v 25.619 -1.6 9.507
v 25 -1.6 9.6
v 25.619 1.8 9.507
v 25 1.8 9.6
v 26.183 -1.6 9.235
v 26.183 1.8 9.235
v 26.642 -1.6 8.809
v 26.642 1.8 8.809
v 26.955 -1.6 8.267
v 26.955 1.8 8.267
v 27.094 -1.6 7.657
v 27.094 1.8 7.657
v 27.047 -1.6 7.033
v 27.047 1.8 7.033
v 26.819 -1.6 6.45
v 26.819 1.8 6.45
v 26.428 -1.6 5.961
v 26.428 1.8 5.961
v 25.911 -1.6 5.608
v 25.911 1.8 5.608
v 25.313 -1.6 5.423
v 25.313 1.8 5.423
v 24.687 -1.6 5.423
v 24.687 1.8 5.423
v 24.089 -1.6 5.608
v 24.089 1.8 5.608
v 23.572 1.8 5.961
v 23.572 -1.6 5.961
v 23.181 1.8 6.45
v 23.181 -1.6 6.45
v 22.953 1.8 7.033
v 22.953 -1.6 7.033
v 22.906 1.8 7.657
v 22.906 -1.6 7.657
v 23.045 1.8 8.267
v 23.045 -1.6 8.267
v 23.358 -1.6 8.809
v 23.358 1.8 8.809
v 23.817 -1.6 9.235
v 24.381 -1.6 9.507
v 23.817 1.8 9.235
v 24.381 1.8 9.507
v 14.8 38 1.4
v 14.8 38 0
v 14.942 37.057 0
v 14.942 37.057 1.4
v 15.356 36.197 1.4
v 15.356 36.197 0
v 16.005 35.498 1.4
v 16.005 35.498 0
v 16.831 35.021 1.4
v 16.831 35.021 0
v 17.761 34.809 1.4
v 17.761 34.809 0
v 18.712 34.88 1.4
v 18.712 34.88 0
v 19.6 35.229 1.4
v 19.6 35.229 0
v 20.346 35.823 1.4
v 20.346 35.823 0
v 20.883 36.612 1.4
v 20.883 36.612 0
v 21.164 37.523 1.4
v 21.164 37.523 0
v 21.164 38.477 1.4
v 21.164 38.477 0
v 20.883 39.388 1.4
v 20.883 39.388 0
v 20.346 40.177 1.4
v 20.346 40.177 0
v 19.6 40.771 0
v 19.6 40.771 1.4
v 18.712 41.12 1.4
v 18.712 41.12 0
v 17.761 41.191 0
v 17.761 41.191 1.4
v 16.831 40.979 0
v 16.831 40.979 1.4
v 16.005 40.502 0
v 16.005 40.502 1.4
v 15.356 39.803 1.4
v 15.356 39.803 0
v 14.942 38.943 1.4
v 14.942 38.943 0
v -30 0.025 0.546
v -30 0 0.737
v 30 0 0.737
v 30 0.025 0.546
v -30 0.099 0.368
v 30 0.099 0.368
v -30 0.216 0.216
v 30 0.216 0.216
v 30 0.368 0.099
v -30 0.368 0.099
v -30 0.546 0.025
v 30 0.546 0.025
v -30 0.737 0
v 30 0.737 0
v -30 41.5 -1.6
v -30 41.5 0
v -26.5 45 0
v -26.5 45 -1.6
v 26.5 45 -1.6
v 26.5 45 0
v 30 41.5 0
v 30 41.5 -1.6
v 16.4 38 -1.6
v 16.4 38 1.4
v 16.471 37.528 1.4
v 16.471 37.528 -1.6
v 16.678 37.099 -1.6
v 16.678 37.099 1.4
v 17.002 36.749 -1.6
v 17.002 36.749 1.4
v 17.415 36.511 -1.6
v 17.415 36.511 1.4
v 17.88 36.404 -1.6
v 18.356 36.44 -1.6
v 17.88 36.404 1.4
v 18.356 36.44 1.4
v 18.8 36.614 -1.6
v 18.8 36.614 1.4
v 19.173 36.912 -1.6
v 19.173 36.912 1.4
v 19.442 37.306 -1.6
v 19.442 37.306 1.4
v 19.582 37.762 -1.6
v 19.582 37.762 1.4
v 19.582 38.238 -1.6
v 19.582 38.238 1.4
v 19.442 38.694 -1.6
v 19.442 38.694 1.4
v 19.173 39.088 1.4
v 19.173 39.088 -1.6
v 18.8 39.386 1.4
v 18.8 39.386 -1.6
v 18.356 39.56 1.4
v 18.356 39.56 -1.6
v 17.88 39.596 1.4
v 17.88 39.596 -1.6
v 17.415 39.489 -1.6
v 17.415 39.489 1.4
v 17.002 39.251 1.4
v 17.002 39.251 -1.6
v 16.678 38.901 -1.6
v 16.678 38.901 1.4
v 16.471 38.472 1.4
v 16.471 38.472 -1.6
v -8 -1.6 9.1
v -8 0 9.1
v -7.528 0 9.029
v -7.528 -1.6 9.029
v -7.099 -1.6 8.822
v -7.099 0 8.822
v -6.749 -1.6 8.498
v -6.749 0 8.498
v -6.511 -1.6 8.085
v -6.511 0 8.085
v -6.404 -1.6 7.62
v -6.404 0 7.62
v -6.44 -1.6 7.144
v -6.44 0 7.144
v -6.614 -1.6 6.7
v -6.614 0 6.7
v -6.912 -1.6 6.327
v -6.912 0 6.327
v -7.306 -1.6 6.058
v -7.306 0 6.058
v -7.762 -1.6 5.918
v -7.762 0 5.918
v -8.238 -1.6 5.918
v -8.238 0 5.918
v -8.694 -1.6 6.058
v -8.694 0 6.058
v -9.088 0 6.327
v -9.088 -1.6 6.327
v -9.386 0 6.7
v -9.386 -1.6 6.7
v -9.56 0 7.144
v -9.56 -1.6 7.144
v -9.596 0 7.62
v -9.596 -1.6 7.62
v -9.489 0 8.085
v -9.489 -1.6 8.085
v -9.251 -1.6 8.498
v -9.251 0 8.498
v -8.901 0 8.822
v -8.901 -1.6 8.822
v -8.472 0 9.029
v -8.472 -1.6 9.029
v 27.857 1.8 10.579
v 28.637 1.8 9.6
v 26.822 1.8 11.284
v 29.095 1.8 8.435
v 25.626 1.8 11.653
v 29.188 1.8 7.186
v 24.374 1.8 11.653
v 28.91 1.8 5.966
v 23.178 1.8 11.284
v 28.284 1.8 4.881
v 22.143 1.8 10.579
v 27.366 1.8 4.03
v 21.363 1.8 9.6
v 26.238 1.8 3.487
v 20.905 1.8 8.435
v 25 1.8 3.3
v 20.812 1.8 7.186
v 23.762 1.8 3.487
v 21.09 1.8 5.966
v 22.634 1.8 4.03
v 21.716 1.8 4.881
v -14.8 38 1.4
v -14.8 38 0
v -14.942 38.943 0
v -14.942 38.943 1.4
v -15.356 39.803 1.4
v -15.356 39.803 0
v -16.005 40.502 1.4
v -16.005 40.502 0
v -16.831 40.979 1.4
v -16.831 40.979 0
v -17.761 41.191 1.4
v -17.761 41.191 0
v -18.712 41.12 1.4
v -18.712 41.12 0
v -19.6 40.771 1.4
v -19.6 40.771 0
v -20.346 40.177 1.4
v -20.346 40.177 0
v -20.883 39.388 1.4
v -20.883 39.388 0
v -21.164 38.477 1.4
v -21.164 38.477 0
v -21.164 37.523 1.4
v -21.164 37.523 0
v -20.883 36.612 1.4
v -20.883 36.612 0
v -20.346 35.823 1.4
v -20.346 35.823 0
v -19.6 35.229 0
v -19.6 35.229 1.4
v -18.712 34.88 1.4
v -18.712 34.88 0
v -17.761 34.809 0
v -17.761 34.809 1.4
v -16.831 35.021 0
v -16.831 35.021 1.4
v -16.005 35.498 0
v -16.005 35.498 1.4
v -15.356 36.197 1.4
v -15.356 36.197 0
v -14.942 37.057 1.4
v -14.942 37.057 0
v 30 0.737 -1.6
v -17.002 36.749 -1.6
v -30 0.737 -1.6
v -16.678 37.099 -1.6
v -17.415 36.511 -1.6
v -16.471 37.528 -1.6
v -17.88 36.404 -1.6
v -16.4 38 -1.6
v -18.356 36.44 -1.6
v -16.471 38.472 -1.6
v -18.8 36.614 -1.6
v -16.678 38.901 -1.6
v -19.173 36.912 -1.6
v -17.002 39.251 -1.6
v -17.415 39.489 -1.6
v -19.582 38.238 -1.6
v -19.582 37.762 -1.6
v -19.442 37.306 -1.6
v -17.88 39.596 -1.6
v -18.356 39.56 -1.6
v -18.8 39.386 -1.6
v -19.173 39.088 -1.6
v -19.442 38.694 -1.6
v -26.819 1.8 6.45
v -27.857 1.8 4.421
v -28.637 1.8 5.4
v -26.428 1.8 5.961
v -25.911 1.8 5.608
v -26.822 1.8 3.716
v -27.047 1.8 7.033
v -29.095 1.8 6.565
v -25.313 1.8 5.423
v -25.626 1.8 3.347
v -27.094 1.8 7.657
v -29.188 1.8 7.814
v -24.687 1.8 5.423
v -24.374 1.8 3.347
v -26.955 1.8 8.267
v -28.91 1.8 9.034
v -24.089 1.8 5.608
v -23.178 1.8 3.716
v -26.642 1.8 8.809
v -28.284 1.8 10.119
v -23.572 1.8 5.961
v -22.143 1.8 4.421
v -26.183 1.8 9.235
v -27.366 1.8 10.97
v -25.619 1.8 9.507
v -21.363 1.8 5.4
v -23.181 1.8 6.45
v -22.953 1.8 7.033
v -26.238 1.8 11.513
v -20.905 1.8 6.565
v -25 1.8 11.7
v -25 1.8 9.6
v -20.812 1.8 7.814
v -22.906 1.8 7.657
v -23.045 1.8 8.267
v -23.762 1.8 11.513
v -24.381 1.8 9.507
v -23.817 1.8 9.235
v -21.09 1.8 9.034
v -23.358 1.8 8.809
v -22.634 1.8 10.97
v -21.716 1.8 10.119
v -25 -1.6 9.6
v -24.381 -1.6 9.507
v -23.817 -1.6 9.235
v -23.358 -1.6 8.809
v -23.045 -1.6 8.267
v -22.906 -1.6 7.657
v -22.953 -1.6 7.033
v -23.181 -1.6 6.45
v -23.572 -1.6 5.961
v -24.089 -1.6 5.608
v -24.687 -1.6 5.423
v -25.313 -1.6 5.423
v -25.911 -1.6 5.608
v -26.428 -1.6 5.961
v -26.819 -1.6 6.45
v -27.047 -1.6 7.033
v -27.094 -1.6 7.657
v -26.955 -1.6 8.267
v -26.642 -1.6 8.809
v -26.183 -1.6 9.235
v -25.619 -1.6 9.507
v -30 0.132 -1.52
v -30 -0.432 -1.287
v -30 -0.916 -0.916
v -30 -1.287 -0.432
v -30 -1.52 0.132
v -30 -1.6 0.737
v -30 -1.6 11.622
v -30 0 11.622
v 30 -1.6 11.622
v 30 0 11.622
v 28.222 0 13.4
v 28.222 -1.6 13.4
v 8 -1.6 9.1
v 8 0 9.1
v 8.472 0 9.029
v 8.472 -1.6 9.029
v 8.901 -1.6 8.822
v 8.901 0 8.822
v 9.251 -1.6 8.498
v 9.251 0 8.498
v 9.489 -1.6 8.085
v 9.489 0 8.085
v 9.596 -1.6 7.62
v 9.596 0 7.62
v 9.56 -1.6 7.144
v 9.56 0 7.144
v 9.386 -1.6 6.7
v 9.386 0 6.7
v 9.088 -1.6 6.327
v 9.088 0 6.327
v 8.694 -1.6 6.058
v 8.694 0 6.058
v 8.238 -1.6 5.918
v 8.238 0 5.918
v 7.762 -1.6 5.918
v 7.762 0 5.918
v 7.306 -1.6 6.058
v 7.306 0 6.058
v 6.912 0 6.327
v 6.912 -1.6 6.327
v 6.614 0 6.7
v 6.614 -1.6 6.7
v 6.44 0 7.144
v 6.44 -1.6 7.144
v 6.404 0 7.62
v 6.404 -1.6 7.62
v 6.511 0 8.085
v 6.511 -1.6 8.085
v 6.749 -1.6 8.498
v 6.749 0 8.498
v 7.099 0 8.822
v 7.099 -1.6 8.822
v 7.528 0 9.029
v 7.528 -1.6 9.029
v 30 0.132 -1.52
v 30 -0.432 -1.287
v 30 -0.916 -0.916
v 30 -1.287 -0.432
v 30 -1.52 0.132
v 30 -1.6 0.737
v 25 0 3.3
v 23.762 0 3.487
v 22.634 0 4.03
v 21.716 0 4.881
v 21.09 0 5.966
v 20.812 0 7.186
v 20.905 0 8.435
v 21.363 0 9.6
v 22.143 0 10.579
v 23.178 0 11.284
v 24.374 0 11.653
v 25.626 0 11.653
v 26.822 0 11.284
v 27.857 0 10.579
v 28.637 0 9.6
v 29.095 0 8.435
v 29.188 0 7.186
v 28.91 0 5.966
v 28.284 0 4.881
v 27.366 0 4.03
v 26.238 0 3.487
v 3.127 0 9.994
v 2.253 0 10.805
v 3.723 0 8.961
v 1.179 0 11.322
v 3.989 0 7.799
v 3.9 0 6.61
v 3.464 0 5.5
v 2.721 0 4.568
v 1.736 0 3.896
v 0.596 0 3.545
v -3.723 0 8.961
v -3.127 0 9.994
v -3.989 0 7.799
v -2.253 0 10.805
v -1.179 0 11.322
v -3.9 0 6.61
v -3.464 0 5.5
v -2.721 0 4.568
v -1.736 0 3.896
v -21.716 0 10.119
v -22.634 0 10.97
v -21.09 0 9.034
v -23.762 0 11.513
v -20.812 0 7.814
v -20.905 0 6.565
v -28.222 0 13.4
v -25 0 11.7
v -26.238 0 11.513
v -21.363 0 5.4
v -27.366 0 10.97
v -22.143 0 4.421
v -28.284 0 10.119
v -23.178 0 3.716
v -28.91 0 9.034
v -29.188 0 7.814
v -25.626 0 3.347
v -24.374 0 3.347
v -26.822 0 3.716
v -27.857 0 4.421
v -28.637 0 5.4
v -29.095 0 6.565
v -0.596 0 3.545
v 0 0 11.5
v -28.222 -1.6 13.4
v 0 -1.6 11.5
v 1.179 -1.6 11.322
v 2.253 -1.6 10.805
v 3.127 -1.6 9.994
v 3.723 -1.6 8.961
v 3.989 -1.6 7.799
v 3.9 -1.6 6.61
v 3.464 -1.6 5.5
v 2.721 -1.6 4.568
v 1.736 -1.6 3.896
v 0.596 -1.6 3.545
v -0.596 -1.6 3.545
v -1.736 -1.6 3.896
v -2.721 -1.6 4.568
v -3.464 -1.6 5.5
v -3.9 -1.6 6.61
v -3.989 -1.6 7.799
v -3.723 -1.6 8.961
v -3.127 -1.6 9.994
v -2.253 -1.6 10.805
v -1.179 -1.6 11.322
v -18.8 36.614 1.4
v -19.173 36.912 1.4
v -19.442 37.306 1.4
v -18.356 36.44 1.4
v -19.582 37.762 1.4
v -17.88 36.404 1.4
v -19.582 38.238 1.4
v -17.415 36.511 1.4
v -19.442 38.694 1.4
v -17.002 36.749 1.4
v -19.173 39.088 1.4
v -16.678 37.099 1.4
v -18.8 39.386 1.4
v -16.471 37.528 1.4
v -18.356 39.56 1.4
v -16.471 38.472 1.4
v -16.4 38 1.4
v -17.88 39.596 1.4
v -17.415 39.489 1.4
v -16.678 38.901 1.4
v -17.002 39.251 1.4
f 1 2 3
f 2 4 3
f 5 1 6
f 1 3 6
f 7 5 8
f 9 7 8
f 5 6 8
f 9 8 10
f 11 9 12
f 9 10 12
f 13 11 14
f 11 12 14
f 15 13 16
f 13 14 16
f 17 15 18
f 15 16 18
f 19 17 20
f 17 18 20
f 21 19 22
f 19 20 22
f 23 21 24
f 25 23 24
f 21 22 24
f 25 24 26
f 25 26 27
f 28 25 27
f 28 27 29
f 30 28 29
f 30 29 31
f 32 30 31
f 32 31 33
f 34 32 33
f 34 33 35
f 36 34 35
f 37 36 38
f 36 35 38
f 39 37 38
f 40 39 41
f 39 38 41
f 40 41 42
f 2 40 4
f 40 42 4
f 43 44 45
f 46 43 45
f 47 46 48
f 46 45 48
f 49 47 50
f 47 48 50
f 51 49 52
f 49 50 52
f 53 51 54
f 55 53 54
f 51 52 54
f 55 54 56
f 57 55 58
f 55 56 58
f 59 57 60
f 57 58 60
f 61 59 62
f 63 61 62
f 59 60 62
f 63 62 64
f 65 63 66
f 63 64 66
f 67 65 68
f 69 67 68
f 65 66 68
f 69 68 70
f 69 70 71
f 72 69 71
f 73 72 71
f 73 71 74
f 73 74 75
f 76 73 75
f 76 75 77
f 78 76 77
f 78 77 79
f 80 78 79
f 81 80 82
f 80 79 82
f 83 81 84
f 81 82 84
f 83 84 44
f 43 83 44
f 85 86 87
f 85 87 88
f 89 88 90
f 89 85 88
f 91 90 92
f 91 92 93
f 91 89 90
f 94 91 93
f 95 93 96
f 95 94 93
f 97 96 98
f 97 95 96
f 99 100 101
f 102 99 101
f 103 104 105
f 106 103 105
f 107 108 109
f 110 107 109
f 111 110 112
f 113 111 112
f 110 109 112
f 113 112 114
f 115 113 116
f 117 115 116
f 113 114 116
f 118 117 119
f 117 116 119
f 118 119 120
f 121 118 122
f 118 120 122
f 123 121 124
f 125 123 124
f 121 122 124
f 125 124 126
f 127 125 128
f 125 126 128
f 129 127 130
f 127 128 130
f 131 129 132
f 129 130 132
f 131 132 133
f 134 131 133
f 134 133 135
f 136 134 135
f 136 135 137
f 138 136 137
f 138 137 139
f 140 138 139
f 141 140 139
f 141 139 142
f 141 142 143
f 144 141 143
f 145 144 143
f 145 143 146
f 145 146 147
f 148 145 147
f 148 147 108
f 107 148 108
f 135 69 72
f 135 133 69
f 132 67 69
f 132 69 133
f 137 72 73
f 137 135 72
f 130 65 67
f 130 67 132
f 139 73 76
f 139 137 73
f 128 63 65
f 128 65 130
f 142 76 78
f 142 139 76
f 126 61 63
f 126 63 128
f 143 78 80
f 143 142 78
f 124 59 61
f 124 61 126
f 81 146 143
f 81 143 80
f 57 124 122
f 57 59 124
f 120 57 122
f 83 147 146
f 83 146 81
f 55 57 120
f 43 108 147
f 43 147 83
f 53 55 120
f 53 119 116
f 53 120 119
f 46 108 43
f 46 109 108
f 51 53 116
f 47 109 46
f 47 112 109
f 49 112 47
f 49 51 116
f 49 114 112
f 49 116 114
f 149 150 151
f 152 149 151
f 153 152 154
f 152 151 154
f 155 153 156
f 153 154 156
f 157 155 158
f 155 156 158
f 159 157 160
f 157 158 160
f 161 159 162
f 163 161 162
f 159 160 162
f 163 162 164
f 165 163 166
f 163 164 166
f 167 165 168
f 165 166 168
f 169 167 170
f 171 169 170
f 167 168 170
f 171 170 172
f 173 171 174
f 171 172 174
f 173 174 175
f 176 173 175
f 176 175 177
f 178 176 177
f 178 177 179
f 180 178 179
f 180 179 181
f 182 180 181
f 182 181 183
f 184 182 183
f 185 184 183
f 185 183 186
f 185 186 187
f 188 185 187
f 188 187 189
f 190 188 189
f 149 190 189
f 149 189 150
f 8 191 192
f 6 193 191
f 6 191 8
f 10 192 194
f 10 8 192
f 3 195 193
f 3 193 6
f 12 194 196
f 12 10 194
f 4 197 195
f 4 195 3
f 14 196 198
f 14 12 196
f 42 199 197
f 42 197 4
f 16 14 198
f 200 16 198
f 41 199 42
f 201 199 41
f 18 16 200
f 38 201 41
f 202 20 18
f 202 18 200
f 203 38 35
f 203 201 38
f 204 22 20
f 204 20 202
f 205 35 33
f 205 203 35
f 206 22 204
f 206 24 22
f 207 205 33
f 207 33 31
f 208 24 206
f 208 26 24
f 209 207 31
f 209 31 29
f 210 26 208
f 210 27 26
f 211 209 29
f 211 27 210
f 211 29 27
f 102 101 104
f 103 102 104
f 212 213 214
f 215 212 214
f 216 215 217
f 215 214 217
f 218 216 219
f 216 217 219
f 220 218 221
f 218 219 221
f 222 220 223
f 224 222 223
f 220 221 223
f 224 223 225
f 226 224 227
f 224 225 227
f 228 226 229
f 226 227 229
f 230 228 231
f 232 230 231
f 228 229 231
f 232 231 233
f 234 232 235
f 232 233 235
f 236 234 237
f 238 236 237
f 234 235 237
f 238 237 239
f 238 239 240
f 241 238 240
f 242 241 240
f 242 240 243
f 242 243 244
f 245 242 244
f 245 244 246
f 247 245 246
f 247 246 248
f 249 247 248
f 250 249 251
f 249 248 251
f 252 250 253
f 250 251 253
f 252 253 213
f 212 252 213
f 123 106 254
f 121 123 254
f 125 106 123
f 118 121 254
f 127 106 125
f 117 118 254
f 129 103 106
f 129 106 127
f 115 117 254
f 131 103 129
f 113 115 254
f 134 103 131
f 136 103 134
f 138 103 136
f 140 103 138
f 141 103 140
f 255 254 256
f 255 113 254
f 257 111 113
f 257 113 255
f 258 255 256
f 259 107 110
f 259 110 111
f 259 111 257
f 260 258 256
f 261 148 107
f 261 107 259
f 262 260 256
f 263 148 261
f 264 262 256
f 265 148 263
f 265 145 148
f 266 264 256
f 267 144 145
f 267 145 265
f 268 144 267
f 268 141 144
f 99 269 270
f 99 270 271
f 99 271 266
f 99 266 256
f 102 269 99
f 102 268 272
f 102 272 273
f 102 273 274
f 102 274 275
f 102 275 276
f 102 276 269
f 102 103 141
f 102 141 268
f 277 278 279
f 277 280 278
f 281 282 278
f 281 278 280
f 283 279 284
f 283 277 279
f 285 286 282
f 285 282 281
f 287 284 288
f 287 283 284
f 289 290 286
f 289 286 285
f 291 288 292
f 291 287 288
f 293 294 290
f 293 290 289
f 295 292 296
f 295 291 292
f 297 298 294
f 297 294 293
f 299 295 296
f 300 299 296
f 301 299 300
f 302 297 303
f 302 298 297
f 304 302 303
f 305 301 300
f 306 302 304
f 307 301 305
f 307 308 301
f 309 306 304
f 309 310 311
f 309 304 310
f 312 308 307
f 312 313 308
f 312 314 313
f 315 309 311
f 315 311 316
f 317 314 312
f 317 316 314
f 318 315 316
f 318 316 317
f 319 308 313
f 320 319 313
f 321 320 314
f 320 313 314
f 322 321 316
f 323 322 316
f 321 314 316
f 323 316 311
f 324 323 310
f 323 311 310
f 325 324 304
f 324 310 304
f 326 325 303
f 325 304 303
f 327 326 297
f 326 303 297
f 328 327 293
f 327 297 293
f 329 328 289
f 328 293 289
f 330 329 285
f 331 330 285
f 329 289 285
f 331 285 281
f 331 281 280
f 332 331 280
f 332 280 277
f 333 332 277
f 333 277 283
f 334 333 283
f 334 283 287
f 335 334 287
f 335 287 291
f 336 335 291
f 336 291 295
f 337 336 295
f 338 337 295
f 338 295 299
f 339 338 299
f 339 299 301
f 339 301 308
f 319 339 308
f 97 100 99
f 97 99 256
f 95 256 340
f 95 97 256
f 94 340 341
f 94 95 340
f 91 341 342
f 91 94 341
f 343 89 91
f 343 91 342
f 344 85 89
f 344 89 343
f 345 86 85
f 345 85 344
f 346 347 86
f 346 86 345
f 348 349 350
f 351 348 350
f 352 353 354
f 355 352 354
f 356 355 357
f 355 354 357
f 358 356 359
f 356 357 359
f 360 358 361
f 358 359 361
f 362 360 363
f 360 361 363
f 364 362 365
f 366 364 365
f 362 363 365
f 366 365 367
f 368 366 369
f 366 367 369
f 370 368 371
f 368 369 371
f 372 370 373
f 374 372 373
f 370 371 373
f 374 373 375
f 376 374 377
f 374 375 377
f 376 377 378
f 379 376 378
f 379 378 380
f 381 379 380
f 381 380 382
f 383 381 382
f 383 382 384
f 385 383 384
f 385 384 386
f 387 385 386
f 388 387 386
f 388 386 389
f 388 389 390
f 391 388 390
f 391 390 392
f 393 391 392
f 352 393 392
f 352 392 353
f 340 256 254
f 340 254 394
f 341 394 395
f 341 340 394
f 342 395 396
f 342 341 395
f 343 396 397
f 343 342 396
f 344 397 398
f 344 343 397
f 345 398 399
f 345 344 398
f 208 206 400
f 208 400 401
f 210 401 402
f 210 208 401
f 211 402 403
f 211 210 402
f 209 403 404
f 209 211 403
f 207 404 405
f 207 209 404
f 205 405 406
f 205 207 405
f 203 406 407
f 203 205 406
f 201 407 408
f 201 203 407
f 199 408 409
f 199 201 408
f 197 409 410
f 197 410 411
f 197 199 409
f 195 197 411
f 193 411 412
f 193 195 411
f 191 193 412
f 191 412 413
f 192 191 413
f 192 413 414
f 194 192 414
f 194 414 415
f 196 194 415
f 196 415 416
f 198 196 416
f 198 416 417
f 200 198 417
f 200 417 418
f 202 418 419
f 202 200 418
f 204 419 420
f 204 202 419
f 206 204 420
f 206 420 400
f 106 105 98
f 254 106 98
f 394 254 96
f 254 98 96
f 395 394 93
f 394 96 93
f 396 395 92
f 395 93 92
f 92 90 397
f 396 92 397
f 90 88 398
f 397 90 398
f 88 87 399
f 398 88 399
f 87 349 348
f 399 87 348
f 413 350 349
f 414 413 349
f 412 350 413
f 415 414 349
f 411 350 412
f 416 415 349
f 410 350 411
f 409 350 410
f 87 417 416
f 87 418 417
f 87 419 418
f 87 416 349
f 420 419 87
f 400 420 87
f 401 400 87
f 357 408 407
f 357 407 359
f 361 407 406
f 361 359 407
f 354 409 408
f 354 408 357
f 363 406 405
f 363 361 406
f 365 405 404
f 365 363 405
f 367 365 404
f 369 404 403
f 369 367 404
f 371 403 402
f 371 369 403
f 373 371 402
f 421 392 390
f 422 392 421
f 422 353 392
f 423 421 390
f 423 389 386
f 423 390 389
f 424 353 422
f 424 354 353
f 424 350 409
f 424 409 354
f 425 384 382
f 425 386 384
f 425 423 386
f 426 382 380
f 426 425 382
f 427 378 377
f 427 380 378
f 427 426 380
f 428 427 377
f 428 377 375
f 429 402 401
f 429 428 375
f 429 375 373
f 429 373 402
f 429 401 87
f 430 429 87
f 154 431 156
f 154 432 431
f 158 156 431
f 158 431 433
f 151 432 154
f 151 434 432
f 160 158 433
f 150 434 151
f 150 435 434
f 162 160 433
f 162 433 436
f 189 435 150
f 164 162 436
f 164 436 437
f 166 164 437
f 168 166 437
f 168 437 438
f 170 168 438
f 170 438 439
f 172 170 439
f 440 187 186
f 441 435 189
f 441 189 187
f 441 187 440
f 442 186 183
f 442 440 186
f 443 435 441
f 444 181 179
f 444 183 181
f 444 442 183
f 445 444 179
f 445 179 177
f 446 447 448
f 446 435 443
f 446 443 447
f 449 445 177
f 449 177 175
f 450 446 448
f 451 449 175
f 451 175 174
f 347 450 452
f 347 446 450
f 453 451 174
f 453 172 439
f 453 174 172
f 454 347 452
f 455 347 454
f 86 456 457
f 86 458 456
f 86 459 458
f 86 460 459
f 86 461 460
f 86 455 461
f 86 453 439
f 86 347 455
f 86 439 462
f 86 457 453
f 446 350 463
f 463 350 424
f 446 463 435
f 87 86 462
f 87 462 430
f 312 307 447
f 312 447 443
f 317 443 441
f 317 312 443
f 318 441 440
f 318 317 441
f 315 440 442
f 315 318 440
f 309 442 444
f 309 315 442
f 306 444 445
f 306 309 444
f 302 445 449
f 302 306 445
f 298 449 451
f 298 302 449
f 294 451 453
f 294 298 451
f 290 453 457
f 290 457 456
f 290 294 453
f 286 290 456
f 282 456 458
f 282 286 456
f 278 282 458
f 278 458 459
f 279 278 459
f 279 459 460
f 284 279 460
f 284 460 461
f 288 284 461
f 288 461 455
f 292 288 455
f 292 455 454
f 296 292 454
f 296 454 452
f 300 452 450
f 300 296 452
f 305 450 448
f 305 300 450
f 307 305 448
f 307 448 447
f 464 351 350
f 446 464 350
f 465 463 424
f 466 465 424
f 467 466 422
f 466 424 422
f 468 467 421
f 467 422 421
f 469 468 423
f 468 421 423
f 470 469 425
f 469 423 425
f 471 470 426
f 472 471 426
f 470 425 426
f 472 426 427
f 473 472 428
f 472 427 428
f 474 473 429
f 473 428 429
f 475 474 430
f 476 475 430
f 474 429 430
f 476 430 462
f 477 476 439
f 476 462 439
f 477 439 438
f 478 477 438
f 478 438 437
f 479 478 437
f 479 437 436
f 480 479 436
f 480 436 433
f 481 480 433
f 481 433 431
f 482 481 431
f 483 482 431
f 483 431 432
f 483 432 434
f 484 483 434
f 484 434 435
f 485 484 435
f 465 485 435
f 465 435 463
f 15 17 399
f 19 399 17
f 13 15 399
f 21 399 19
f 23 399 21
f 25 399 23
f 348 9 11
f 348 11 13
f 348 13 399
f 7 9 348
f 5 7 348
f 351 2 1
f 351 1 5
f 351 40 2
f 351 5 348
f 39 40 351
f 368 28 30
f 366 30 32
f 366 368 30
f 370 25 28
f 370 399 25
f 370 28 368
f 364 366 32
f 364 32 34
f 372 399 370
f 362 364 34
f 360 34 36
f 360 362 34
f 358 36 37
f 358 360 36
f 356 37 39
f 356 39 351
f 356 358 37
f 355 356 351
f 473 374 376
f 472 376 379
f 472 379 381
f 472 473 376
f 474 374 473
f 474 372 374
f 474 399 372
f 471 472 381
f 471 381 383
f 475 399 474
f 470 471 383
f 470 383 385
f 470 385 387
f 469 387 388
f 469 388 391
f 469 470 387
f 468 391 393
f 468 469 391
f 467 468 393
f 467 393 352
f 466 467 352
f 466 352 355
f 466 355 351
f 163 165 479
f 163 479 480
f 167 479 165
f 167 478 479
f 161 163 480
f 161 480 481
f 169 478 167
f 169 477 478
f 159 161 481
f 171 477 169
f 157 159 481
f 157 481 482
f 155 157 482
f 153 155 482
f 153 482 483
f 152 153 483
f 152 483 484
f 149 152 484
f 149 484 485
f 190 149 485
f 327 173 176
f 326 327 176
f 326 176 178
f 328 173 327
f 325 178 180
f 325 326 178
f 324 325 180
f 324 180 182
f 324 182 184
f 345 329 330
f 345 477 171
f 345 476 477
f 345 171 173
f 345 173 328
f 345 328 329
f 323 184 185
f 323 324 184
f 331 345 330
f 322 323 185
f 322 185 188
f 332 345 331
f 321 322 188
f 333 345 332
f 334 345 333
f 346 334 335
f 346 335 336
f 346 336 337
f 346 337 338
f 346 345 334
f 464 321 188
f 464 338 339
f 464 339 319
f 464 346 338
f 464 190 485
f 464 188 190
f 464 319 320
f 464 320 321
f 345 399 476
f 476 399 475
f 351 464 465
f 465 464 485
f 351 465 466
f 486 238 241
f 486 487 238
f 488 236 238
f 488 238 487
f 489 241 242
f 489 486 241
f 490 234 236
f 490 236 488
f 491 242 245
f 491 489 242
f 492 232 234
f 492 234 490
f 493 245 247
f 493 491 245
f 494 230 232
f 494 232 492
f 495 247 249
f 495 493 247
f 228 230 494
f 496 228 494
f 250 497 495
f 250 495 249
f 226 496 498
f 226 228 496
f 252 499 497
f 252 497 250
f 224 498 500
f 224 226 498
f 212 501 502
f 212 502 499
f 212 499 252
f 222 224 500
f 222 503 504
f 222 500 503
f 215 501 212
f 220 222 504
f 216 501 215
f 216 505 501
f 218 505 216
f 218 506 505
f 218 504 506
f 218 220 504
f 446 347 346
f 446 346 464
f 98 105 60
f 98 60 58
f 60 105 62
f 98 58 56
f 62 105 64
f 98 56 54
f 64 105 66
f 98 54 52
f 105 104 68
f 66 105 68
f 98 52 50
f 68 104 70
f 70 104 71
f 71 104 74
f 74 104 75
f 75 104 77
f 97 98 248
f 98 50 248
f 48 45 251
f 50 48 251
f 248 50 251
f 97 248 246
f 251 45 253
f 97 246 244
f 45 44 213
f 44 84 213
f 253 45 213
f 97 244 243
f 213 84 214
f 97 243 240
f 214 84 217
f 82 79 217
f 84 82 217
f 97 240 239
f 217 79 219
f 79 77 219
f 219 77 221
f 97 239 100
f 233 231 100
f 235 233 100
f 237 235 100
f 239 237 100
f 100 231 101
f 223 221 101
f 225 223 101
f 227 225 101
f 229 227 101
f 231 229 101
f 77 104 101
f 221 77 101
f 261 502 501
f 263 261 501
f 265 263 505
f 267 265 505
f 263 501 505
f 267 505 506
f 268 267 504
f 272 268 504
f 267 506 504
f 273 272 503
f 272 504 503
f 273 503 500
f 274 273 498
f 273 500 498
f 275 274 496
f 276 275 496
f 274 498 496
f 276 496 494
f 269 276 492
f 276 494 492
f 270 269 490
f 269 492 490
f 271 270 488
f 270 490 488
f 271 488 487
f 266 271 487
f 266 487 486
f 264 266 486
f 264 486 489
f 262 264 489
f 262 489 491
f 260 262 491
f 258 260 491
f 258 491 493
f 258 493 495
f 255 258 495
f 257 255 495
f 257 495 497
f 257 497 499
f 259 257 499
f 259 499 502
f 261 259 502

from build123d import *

# Parameters (mm, degrees)
SM_BASE_FLANGE_1_DEPTH           = 1.6
SM_EDGE_FLANGE_1_STRIP_W         = 7.8732
SM_EDGE_FLANGE_1_STRIP_H         = 1.6
SM_EDGE_FLANGE_1_STRIP_CUT_DEPTH = 60
SM_EDGE_FLANGE_1_DEPTH           = 60
CUT_EXTRUDE_1_DEPTH              = 56.718578589
SKETCH_9_R                       = 2.1
SKETCH_9_R_2                     = 1.6
SKETCH_9_R_3                     = 4
CUT_EXTRUDE_3_DEPTH              = 10
EXTRUDE_START                    = 1.8
SKETCH_10_R                      = 4.2
SKETCH_10_R_2                    = 2.1
EXTRUDE_2_DEPTH                  = 1.8
SKETCH_11_R                      = 3.2
EXTRUDE_3_DEPTH                  = 1.4
SKETCH_12_R                      = 1.6
CUT_EXTRUDE_4_DEPTH              = 56.398555938


# Sheet-metal steps are written as plain solids
with BuildPart() as part:
    # Sketch 1 → 基体-法兰1 (new body)
    with BuildSketch(Plane.XY):
        Polygon((-26.5, 45), (26.5, 45), (30, 41.5), (30, 0), (-30, 0), (-30, 41.5), align=None)
    extrude(amount=-SM_BASE_FLANGE_1_DEPTH)

    # 边线-法兰1 strip (across the edge) → 边线-法兰1 strip cut (cut)
    with BuildSketch(Plane.YZ.offset(-30)):
        with Locations((-3.2, -0.8)):
            Rectangle(SM_EDGE_FLANGE_1_STRIP_W, SM_EDGE_FLANGE_1_STRIP_H)
    extrude(amount=SM_EDGE_FLANGE_1_STRIP_CUT_DEPTH, mode=Mode.SUBTRACT)

    # 边线-法兰1 section (across the edge) → 边线-法兰1 (add)
    with BuildSketch(Plane.YZ.offset(-30)):
        with BuildLine():
            Line((-1.6, 0.7366), (-1.6, 13.4))
            Line((-1.6, 13.4), (0, 13.4))
            Line((0, 13.4), (0, 0.7366))
            ThreePointArc((0, 0.7366), (0.215745145, 0.215745145), (0.7366, 0))
            Line((0.7366, 0), (0.7366, -1.6))
            ThreePointArc((0.7366, -1.6), (-0.915625705, -0.915625705), (-1.6, 0.7366))
        make_face()
    extrude(amount=SM_EDGE_FLANGE_1_DEPTH)

    # 草图8 → 切除-拉伸1 (cut, through all)
    with BuildSketch(Plane(origin=(0, 0, 0), x_dir=(1, 0, 0), z_dir=(0, 1, 0))):
        Polygon((-30, -11.622497289), (-28.222497289, -13.4), (-30, -13.4), align=None)
        Polygon((28.222497289, -13.4), (30, -13.4), (30, -11.622497289), align=None)
    extrude(amount=-CUT_EXTRUDE_1_DEPTH, mode=Mode.SUBTRACT)

    # 草图9 → 切除-拉伸3 (cut)
    with BuildSketch(Plane(origin=(0, 0, 0), x_dir=(1, 0, 0), z_dir=(0, 1, 0))):
        with Locations(Location((-25, -7.5, 0), (0, 0, 270))):
            Circle(SKETCH_9_R)
        with Locations(Location((-8, -7.5, 0), (0, 0, 270))):
            Circle(SKETCH_9_R_2)
        with Locations(Location((0, -7.5, 0), (0, 0, 270))):
            Circle(SKETCH_9_R_3)
        with Locations(Location((25, -7.5, 0), (0, 0, 270))):
            Circle(SKETCH_9_R)
        with Locations(Location((8, -7.5, 0), (0, 0, 270))):
            Circle(SKETCH_9_R_2)
    extrude(amount=-CUT_EXTRUDE_3_DEPTH, mode=Mode.SUBTRACT)

    # 草图10 → 凸台-拉伸2 (add)
    # profile 1 of 2: a face of its own
    with BuildSketch(Plane(origin=(0, 0, 0), x_dir=(1, 0, 0), z_dir=(0, 1, 0)).offset(EXTRUDE_START)):
        with Locations(Location((-25, -7.5, 0), (0, 0, 270))):
            Circle(SKETCH_10_R)
        with Locations(Location((-25, -7.5, 0), (0, 0, 270))):
            Circle(SKETCH_10_R_2, mode=Mode.SUBTRACT)
    # profile 2 of 2: a face of its own
    with BuildSketch(Plane(origin=(0, 0, 0), x_dir=(1, 0, 0), z_dir=(0, 1, 0)).offset(EXTRUDE_START)):
        with Locations(Location((25, -7.5, 0), (0, 0, 90))):
            Circle(SKETCH_10_R)
        with Locations(Location((25, -7.5, 0), (0, 0, 270))):
            Circle(SKETCH_10_R_2, mode=Mode.SUBTRACT)
    extrude(amount=-EXTRUDE_2_DEPTH)

    # 草图11 → 凸台-拉伸3 (add)
    with BuildSketch(Plane.XY):
        with Locations((-18, 38)):
            Circle(SKETCH_11_R)
        with Locations(Location((18, 38, 0), (0, 0, 180))):
            Circle(SKETCH_11_R)
    extrude(amount=EXTRUDE_3_DEPTH)

    # 草图12 → 切除-拉伸4 (cut, through all)
    with BuildSketch(Plane.XY.offset(1.4)):
        with Locations((-18, 38)):
            Circle(SKETCH_12_R)
        with Locations(Location((18, 38, 0), (0, 0, 180))):
            Circle(SKETCH_12_R)
    extrude(amount=-CUT_EXTRUDE_4_DEPTH, mode=Mode.SUBTRACT)


solid = part.part
